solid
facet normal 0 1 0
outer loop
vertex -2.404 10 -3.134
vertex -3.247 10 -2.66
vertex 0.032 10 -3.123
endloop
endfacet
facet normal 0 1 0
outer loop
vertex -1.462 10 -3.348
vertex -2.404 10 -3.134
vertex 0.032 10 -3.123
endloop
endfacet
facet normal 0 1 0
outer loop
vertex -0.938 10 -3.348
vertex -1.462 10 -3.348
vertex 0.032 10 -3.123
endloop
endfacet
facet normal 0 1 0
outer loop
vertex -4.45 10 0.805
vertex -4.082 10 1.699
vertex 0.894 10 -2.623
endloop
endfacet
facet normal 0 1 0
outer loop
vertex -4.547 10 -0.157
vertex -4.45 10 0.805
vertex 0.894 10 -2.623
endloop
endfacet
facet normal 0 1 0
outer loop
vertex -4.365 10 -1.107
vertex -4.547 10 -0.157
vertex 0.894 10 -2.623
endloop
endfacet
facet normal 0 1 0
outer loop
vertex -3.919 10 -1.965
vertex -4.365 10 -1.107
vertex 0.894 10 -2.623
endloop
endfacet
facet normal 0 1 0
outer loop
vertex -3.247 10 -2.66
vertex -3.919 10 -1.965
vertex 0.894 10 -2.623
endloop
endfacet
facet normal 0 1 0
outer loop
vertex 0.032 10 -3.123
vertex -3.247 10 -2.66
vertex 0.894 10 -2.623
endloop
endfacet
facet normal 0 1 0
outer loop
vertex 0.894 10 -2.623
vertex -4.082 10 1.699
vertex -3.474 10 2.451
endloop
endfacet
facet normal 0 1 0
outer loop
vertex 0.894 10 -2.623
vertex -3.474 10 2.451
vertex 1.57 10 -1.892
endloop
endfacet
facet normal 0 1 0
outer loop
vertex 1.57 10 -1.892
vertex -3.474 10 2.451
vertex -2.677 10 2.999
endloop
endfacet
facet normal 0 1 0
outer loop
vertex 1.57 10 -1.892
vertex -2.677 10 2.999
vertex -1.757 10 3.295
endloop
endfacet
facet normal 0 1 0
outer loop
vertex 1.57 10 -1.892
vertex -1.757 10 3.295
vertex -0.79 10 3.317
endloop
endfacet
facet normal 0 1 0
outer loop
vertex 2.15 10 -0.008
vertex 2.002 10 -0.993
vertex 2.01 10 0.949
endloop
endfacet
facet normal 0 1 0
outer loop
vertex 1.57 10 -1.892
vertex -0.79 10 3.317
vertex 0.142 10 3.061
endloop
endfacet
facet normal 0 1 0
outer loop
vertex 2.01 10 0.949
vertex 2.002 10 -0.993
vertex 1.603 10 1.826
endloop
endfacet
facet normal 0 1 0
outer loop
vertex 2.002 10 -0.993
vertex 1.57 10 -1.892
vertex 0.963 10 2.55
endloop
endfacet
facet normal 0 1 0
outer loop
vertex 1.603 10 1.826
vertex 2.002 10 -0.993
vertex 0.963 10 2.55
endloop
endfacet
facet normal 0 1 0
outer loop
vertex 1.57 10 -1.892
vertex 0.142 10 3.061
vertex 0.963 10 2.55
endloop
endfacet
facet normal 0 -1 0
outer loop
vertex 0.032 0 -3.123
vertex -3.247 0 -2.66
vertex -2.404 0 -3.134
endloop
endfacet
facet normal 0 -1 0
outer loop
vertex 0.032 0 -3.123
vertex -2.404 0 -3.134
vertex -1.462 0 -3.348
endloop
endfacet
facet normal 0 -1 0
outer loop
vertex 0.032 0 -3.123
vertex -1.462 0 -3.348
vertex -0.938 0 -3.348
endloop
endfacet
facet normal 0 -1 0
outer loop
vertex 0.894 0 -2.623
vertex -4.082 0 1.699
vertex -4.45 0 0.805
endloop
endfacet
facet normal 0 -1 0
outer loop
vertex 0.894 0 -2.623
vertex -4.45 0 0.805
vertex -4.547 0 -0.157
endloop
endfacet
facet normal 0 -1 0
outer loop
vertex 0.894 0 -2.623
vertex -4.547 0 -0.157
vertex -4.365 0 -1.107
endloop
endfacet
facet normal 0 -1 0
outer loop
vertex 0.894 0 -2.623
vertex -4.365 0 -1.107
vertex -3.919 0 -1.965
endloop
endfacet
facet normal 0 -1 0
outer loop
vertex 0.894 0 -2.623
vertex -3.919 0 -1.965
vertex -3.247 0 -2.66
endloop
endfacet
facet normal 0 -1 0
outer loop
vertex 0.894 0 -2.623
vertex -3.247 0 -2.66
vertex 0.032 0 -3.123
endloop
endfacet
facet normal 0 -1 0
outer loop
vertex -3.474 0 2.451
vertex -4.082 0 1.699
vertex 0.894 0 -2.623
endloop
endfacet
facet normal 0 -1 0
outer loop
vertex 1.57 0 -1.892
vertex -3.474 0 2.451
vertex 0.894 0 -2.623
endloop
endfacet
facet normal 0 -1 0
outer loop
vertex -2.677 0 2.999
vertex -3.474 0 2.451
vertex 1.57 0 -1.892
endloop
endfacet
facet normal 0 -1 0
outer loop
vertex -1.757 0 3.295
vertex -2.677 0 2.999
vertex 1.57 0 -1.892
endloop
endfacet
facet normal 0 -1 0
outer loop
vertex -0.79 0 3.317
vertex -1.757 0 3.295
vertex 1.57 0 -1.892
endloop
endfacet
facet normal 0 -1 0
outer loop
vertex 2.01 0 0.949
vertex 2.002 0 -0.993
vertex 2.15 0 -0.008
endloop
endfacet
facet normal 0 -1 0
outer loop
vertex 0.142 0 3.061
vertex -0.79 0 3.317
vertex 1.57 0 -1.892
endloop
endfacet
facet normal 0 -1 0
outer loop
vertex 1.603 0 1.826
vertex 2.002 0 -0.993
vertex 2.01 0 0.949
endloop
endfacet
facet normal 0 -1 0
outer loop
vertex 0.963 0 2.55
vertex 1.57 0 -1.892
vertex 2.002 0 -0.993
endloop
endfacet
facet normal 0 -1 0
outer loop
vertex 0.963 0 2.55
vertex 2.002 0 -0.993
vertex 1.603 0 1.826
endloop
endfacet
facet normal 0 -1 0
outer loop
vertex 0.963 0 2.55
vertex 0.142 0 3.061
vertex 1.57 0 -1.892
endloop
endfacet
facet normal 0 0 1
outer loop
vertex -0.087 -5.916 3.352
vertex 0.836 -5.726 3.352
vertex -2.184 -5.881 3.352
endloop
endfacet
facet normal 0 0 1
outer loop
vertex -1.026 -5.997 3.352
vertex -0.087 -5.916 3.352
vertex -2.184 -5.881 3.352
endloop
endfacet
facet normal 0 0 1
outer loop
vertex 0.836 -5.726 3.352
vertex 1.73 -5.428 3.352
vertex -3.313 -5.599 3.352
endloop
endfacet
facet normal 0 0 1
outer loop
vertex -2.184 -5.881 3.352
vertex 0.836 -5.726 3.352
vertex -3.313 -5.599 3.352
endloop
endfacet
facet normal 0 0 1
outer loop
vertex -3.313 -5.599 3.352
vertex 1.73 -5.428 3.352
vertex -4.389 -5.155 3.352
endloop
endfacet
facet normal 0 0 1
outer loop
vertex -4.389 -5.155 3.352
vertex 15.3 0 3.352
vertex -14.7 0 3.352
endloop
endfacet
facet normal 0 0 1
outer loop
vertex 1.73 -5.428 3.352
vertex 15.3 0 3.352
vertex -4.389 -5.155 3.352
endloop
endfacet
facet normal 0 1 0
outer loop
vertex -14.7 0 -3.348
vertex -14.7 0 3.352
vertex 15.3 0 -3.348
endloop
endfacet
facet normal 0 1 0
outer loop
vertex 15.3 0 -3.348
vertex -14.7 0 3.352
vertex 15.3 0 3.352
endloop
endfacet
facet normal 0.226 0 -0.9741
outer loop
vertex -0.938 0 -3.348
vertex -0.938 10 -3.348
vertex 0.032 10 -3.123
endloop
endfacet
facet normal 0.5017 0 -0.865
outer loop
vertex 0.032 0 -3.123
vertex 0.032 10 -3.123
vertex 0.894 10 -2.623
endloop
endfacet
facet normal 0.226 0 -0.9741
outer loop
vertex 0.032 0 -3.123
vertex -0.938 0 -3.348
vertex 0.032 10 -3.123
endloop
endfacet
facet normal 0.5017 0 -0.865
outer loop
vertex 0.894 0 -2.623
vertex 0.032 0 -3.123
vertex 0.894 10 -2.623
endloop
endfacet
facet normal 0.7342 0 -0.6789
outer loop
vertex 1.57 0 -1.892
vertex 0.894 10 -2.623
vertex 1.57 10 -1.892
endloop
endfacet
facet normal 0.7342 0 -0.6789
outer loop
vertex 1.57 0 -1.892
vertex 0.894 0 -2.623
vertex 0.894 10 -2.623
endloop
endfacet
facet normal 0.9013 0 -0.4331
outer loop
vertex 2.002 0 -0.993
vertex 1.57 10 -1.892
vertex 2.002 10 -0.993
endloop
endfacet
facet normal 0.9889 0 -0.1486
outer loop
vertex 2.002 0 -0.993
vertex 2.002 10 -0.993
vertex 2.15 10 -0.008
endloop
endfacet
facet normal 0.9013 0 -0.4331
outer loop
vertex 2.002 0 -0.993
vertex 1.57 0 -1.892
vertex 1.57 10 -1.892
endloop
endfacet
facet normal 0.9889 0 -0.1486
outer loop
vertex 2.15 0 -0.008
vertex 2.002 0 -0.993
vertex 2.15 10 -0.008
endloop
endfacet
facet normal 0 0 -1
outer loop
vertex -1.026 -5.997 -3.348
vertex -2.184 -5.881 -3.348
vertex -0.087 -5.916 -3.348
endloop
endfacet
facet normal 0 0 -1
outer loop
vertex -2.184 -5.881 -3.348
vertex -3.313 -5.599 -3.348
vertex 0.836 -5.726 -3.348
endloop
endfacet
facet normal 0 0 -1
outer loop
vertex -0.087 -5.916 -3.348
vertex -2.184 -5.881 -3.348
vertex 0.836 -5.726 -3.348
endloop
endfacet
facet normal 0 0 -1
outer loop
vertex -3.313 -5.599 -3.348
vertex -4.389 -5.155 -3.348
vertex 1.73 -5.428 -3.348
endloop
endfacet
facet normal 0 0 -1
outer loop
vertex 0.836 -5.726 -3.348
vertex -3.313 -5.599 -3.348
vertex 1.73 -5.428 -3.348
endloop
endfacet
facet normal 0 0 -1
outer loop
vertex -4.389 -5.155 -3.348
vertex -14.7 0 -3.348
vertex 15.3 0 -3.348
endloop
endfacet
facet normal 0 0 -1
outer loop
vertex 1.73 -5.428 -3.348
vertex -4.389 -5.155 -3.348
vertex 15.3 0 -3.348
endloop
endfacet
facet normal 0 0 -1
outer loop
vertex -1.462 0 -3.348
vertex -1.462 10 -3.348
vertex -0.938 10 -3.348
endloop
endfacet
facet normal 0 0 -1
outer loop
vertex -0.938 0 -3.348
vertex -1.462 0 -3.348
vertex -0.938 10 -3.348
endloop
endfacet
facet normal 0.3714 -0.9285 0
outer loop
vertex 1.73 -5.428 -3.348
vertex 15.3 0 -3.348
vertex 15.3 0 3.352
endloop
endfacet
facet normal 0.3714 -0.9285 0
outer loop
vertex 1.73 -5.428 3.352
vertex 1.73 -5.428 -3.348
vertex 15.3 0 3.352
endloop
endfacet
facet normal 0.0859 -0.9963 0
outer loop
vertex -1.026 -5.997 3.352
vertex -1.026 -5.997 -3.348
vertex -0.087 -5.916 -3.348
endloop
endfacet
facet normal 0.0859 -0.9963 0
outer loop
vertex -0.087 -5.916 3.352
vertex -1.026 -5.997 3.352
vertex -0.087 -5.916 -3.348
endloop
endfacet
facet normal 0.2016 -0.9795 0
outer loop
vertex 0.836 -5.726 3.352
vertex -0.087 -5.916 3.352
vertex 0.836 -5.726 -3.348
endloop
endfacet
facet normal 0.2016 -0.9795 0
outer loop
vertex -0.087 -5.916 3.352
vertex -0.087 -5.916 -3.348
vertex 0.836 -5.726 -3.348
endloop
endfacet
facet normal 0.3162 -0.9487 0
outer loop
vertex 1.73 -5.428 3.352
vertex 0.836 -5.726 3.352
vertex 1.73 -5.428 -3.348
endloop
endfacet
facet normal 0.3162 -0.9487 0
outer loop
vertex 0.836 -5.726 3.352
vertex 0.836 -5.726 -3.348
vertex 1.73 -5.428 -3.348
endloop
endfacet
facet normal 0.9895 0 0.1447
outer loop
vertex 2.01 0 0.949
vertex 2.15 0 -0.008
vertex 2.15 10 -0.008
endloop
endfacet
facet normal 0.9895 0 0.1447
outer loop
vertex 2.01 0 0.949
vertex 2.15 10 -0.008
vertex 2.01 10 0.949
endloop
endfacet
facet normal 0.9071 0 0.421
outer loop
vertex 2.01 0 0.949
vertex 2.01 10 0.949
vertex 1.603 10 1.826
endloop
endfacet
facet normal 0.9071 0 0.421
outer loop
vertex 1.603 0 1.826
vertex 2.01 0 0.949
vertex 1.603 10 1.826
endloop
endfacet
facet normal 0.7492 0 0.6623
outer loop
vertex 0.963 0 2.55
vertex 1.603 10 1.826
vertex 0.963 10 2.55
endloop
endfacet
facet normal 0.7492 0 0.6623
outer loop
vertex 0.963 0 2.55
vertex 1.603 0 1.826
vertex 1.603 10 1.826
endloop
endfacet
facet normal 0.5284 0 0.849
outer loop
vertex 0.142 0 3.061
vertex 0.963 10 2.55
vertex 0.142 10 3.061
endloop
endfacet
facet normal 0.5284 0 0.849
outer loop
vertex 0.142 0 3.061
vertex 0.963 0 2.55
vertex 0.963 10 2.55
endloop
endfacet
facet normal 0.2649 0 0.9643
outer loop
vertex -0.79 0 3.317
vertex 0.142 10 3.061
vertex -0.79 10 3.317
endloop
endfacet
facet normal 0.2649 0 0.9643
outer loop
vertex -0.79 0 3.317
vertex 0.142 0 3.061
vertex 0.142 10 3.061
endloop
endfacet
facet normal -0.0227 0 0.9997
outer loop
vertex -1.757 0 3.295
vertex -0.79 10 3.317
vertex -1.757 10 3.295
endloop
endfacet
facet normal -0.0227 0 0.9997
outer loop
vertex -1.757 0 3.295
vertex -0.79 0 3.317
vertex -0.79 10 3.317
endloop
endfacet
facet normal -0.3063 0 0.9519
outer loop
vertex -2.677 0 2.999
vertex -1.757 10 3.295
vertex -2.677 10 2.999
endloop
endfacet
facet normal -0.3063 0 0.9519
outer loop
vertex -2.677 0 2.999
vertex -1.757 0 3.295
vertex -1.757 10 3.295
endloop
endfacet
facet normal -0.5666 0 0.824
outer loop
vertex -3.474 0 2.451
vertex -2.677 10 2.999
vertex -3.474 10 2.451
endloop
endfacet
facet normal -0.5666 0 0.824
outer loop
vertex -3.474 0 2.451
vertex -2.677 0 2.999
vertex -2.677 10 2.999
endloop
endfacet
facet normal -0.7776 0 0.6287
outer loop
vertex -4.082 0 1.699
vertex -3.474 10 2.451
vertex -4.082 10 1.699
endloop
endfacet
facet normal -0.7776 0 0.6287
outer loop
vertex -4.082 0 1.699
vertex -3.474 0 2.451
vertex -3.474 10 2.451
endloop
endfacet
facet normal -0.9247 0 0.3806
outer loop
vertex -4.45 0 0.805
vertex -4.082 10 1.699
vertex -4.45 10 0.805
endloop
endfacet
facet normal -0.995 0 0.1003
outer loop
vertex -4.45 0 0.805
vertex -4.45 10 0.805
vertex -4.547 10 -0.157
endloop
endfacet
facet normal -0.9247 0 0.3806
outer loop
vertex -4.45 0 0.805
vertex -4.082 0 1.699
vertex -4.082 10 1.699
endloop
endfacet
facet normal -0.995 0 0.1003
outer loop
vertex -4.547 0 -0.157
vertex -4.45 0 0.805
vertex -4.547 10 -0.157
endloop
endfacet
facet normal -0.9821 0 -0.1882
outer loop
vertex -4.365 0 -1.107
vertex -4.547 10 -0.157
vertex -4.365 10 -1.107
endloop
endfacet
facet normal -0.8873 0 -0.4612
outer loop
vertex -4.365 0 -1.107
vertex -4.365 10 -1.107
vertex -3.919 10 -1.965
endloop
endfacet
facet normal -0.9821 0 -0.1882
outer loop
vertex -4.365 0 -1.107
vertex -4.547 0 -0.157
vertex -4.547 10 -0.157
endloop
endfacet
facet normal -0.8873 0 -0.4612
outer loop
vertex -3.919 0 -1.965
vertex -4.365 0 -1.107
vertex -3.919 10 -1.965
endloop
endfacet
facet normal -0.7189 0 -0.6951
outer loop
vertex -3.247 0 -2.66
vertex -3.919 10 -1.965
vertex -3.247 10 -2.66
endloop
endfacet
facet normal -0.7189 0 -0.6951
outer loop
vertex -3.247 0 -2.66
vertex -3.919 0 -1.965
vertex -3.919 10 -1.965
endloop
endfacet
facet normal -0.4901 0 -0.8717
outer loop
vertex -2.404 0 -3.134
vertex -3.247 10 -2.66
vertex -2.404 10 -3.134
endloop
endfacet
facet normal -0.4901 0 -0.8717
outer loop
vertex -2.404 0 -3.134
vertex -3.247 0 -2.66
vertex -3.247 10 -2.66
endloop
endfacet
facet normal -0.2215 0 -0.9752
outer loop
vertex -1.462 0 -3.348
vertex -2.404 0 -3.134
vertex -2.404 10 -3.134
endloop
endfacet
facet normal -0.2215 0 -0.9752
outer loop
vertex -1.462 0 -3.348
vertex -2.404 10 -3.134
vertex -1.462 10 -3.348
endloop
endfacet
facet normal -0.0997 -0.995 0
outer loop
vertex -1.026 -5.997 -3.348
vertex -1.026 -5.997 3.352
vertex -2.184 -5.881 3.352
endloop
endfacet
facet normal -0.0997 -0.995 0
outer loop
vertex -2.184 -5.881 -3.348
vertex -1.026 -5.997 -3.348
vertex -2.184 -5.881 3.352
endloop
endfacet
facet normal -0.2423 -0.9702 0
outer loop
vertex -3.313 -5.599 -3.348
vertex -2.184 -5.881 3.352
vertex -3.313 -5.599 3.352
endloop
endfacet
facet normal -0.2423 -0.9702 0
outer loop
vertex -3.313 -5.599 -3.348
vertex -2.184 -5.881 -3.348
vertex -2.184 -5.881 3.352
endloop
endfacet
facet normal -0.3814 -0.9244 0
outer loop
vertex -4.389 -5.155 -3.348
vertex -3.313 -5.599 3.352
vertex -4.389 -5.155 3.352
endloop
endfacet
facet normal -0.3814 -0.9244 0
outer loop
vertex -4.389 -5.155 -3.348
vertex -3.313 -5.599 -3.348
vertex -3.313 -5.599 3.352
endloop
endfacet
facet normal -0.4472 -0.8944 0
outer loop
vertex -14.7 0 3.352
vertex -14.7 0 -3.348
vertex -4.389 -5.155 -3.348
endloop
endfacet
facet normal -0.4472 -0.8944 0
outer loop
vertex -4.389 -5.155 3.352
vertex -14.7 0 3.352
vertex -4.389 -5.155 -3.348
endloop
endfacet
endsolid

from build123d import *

# Parameters (mm, degrees)
F1_DEPTH    = 10
F2_DEPTH    = 6
F3_T1_DEPTH = 68.8558929709
F4_SIZE2    = 14.99999
F4_SIZE     = 5.99999
F5_T1_DEPTH = 16.1427191
F5_T3_DEPTH = 14.4032889904


# Not quite as in the source:
# - a fillet or chamfer that OpenCascade refuses, or shapes differently, is made with other operations: its cross-section is extruded or revolved along the edge and cut away or added
# - a fillet or chamfer is up to 0.001 mm smaller than in the source, because OpenCascade refuses the exact size


with BuildPart() as f1:
    # F0 (on Front) → F1 (new body)
    with BuildSketch(Plane.XZ):
        with BuildLine():
            ThreePointArc((2.15, -0.0081778196), (-3.4744734584, 2.4513486566), (-1.4615047685, -3.3479555451))
            Line((-1.4615047685, -3.3479555451), (-0.9384952315, -3.3479555451))
            ThreePointArc((-0.9384952315, -3.3479555451), (1.2595264762, -2.2826512779), (2.15, -0.0081778196))
        make_face()
    extrude(amount=-F1_DEPTH)


with BuildPart() as f2:
    # F0 (on Front) → F2 (new body)
    with BuildSketch(Plane.XZ):
        with BuildLine():
            Line((15.3, 3.3520444549), (-14.7, 3.3520444549))
            Line((-14.7, 3.3520444549), (-14.7, -3.3479555451))
            Line((-14.7, -3.3479555451), (-1.4615047685, -3.3479555451))
            ThreePointArc((-1.4615047685, -3.3479555451), (-3.4744734584, 2.4513486566), (2.15, -0.0081778196))
            ThreePointArc((2.15, -0.0081778196), (1.2595264762, -2.2826512779), (-0.9384952315, -3.3479555451))
            Line((-0.9384952315, -3.3479555451), (15.3, -3.3479555451))
            Line((15.3, -3.3479555451), (15.3, 3.3520444549))
        make_face()
        with BuildLine():
            ThreePointArc((2.15, -0.0081778196), (-3.4744734584, 2.4513486566), (-1.4615047685, -3.3479555451))
            Line((-1.4615047685, -3.3479555451), (-0.9384952315, -3.3479555451))
            ThreePointArc((-0.9384952315, -3.3479555451), (1.2595264762, -2.2826512779), (2.15, -0.0081778196))
        make_face()
    extrude(amount=F2_DEPTH)

    # F3: chamfer of 12 x 6 on 1 edges, made by hand

    # F3_s2 → F3_t1 (cut)
    with BuildSketch(Plane.XY.offset(-34.4259020306)):
        Polygon((-14.7, 0), (-2.7, -6), (-14.7, -6), align=None)
    extrude(amount=F3_T1_DEPTH, mode=Mode.SUBTRACT)

    # F4 (size 6 and 15 in the source; OpenCascade refuses exactly that, so slightly less here)
    f4_edges = [f2.edges().sort_by_distance(p)[0] for p in [
        (15.3, -6, 0.002044),
    ]]
    f4_side = f2.faces().sort_by_distance((15.3, -3, 0.002044))[0]
    chamfer(f4_edges, length=F4_SIZE, length2=F4_SIZE2, reference=f4_side)

    # F5: fillet of radius 8 on 2 edges, made by hand

    # F5_s2 → F5_t1 (cut)
    with BuildSketch(Plane.XY.offset(-8.0693150951)):
        with BuildLine():
            ThreePointArc((-0.81145618, -6), (-2.6494795444, -5.7859919157), (-4.389164944, -5.155417528))
            Line((-4.389164944, -5.155417528), (-2.7, -6))
            Line((-2.7, -6), (-0.81145618, -6))
        make_face()
    extrude(amount=F5_T1_DEPTH, mode=Mode.SUBTRACT)

    # F5_s4 → F5_t3 (cut)
    with BuildSketch(Plane.XY.offset(-7.1996000403)):
        with BuildLine():
            ThreePointArc((-1.2406477981, -6), (0.2722110167, -5.8556513547), (1.7304750514, -5.4278145516))
            Line((1.7304750514, -5.4278145516), (0.30001, -6))
            Line((0.30001, -6), (-1.2406477981, -6))
        make_face()
    extrude(amount=F5_T3_DEPTH, mode=Mode.SUBTRACT)


solid = Compound([f1.part, f2.part])
